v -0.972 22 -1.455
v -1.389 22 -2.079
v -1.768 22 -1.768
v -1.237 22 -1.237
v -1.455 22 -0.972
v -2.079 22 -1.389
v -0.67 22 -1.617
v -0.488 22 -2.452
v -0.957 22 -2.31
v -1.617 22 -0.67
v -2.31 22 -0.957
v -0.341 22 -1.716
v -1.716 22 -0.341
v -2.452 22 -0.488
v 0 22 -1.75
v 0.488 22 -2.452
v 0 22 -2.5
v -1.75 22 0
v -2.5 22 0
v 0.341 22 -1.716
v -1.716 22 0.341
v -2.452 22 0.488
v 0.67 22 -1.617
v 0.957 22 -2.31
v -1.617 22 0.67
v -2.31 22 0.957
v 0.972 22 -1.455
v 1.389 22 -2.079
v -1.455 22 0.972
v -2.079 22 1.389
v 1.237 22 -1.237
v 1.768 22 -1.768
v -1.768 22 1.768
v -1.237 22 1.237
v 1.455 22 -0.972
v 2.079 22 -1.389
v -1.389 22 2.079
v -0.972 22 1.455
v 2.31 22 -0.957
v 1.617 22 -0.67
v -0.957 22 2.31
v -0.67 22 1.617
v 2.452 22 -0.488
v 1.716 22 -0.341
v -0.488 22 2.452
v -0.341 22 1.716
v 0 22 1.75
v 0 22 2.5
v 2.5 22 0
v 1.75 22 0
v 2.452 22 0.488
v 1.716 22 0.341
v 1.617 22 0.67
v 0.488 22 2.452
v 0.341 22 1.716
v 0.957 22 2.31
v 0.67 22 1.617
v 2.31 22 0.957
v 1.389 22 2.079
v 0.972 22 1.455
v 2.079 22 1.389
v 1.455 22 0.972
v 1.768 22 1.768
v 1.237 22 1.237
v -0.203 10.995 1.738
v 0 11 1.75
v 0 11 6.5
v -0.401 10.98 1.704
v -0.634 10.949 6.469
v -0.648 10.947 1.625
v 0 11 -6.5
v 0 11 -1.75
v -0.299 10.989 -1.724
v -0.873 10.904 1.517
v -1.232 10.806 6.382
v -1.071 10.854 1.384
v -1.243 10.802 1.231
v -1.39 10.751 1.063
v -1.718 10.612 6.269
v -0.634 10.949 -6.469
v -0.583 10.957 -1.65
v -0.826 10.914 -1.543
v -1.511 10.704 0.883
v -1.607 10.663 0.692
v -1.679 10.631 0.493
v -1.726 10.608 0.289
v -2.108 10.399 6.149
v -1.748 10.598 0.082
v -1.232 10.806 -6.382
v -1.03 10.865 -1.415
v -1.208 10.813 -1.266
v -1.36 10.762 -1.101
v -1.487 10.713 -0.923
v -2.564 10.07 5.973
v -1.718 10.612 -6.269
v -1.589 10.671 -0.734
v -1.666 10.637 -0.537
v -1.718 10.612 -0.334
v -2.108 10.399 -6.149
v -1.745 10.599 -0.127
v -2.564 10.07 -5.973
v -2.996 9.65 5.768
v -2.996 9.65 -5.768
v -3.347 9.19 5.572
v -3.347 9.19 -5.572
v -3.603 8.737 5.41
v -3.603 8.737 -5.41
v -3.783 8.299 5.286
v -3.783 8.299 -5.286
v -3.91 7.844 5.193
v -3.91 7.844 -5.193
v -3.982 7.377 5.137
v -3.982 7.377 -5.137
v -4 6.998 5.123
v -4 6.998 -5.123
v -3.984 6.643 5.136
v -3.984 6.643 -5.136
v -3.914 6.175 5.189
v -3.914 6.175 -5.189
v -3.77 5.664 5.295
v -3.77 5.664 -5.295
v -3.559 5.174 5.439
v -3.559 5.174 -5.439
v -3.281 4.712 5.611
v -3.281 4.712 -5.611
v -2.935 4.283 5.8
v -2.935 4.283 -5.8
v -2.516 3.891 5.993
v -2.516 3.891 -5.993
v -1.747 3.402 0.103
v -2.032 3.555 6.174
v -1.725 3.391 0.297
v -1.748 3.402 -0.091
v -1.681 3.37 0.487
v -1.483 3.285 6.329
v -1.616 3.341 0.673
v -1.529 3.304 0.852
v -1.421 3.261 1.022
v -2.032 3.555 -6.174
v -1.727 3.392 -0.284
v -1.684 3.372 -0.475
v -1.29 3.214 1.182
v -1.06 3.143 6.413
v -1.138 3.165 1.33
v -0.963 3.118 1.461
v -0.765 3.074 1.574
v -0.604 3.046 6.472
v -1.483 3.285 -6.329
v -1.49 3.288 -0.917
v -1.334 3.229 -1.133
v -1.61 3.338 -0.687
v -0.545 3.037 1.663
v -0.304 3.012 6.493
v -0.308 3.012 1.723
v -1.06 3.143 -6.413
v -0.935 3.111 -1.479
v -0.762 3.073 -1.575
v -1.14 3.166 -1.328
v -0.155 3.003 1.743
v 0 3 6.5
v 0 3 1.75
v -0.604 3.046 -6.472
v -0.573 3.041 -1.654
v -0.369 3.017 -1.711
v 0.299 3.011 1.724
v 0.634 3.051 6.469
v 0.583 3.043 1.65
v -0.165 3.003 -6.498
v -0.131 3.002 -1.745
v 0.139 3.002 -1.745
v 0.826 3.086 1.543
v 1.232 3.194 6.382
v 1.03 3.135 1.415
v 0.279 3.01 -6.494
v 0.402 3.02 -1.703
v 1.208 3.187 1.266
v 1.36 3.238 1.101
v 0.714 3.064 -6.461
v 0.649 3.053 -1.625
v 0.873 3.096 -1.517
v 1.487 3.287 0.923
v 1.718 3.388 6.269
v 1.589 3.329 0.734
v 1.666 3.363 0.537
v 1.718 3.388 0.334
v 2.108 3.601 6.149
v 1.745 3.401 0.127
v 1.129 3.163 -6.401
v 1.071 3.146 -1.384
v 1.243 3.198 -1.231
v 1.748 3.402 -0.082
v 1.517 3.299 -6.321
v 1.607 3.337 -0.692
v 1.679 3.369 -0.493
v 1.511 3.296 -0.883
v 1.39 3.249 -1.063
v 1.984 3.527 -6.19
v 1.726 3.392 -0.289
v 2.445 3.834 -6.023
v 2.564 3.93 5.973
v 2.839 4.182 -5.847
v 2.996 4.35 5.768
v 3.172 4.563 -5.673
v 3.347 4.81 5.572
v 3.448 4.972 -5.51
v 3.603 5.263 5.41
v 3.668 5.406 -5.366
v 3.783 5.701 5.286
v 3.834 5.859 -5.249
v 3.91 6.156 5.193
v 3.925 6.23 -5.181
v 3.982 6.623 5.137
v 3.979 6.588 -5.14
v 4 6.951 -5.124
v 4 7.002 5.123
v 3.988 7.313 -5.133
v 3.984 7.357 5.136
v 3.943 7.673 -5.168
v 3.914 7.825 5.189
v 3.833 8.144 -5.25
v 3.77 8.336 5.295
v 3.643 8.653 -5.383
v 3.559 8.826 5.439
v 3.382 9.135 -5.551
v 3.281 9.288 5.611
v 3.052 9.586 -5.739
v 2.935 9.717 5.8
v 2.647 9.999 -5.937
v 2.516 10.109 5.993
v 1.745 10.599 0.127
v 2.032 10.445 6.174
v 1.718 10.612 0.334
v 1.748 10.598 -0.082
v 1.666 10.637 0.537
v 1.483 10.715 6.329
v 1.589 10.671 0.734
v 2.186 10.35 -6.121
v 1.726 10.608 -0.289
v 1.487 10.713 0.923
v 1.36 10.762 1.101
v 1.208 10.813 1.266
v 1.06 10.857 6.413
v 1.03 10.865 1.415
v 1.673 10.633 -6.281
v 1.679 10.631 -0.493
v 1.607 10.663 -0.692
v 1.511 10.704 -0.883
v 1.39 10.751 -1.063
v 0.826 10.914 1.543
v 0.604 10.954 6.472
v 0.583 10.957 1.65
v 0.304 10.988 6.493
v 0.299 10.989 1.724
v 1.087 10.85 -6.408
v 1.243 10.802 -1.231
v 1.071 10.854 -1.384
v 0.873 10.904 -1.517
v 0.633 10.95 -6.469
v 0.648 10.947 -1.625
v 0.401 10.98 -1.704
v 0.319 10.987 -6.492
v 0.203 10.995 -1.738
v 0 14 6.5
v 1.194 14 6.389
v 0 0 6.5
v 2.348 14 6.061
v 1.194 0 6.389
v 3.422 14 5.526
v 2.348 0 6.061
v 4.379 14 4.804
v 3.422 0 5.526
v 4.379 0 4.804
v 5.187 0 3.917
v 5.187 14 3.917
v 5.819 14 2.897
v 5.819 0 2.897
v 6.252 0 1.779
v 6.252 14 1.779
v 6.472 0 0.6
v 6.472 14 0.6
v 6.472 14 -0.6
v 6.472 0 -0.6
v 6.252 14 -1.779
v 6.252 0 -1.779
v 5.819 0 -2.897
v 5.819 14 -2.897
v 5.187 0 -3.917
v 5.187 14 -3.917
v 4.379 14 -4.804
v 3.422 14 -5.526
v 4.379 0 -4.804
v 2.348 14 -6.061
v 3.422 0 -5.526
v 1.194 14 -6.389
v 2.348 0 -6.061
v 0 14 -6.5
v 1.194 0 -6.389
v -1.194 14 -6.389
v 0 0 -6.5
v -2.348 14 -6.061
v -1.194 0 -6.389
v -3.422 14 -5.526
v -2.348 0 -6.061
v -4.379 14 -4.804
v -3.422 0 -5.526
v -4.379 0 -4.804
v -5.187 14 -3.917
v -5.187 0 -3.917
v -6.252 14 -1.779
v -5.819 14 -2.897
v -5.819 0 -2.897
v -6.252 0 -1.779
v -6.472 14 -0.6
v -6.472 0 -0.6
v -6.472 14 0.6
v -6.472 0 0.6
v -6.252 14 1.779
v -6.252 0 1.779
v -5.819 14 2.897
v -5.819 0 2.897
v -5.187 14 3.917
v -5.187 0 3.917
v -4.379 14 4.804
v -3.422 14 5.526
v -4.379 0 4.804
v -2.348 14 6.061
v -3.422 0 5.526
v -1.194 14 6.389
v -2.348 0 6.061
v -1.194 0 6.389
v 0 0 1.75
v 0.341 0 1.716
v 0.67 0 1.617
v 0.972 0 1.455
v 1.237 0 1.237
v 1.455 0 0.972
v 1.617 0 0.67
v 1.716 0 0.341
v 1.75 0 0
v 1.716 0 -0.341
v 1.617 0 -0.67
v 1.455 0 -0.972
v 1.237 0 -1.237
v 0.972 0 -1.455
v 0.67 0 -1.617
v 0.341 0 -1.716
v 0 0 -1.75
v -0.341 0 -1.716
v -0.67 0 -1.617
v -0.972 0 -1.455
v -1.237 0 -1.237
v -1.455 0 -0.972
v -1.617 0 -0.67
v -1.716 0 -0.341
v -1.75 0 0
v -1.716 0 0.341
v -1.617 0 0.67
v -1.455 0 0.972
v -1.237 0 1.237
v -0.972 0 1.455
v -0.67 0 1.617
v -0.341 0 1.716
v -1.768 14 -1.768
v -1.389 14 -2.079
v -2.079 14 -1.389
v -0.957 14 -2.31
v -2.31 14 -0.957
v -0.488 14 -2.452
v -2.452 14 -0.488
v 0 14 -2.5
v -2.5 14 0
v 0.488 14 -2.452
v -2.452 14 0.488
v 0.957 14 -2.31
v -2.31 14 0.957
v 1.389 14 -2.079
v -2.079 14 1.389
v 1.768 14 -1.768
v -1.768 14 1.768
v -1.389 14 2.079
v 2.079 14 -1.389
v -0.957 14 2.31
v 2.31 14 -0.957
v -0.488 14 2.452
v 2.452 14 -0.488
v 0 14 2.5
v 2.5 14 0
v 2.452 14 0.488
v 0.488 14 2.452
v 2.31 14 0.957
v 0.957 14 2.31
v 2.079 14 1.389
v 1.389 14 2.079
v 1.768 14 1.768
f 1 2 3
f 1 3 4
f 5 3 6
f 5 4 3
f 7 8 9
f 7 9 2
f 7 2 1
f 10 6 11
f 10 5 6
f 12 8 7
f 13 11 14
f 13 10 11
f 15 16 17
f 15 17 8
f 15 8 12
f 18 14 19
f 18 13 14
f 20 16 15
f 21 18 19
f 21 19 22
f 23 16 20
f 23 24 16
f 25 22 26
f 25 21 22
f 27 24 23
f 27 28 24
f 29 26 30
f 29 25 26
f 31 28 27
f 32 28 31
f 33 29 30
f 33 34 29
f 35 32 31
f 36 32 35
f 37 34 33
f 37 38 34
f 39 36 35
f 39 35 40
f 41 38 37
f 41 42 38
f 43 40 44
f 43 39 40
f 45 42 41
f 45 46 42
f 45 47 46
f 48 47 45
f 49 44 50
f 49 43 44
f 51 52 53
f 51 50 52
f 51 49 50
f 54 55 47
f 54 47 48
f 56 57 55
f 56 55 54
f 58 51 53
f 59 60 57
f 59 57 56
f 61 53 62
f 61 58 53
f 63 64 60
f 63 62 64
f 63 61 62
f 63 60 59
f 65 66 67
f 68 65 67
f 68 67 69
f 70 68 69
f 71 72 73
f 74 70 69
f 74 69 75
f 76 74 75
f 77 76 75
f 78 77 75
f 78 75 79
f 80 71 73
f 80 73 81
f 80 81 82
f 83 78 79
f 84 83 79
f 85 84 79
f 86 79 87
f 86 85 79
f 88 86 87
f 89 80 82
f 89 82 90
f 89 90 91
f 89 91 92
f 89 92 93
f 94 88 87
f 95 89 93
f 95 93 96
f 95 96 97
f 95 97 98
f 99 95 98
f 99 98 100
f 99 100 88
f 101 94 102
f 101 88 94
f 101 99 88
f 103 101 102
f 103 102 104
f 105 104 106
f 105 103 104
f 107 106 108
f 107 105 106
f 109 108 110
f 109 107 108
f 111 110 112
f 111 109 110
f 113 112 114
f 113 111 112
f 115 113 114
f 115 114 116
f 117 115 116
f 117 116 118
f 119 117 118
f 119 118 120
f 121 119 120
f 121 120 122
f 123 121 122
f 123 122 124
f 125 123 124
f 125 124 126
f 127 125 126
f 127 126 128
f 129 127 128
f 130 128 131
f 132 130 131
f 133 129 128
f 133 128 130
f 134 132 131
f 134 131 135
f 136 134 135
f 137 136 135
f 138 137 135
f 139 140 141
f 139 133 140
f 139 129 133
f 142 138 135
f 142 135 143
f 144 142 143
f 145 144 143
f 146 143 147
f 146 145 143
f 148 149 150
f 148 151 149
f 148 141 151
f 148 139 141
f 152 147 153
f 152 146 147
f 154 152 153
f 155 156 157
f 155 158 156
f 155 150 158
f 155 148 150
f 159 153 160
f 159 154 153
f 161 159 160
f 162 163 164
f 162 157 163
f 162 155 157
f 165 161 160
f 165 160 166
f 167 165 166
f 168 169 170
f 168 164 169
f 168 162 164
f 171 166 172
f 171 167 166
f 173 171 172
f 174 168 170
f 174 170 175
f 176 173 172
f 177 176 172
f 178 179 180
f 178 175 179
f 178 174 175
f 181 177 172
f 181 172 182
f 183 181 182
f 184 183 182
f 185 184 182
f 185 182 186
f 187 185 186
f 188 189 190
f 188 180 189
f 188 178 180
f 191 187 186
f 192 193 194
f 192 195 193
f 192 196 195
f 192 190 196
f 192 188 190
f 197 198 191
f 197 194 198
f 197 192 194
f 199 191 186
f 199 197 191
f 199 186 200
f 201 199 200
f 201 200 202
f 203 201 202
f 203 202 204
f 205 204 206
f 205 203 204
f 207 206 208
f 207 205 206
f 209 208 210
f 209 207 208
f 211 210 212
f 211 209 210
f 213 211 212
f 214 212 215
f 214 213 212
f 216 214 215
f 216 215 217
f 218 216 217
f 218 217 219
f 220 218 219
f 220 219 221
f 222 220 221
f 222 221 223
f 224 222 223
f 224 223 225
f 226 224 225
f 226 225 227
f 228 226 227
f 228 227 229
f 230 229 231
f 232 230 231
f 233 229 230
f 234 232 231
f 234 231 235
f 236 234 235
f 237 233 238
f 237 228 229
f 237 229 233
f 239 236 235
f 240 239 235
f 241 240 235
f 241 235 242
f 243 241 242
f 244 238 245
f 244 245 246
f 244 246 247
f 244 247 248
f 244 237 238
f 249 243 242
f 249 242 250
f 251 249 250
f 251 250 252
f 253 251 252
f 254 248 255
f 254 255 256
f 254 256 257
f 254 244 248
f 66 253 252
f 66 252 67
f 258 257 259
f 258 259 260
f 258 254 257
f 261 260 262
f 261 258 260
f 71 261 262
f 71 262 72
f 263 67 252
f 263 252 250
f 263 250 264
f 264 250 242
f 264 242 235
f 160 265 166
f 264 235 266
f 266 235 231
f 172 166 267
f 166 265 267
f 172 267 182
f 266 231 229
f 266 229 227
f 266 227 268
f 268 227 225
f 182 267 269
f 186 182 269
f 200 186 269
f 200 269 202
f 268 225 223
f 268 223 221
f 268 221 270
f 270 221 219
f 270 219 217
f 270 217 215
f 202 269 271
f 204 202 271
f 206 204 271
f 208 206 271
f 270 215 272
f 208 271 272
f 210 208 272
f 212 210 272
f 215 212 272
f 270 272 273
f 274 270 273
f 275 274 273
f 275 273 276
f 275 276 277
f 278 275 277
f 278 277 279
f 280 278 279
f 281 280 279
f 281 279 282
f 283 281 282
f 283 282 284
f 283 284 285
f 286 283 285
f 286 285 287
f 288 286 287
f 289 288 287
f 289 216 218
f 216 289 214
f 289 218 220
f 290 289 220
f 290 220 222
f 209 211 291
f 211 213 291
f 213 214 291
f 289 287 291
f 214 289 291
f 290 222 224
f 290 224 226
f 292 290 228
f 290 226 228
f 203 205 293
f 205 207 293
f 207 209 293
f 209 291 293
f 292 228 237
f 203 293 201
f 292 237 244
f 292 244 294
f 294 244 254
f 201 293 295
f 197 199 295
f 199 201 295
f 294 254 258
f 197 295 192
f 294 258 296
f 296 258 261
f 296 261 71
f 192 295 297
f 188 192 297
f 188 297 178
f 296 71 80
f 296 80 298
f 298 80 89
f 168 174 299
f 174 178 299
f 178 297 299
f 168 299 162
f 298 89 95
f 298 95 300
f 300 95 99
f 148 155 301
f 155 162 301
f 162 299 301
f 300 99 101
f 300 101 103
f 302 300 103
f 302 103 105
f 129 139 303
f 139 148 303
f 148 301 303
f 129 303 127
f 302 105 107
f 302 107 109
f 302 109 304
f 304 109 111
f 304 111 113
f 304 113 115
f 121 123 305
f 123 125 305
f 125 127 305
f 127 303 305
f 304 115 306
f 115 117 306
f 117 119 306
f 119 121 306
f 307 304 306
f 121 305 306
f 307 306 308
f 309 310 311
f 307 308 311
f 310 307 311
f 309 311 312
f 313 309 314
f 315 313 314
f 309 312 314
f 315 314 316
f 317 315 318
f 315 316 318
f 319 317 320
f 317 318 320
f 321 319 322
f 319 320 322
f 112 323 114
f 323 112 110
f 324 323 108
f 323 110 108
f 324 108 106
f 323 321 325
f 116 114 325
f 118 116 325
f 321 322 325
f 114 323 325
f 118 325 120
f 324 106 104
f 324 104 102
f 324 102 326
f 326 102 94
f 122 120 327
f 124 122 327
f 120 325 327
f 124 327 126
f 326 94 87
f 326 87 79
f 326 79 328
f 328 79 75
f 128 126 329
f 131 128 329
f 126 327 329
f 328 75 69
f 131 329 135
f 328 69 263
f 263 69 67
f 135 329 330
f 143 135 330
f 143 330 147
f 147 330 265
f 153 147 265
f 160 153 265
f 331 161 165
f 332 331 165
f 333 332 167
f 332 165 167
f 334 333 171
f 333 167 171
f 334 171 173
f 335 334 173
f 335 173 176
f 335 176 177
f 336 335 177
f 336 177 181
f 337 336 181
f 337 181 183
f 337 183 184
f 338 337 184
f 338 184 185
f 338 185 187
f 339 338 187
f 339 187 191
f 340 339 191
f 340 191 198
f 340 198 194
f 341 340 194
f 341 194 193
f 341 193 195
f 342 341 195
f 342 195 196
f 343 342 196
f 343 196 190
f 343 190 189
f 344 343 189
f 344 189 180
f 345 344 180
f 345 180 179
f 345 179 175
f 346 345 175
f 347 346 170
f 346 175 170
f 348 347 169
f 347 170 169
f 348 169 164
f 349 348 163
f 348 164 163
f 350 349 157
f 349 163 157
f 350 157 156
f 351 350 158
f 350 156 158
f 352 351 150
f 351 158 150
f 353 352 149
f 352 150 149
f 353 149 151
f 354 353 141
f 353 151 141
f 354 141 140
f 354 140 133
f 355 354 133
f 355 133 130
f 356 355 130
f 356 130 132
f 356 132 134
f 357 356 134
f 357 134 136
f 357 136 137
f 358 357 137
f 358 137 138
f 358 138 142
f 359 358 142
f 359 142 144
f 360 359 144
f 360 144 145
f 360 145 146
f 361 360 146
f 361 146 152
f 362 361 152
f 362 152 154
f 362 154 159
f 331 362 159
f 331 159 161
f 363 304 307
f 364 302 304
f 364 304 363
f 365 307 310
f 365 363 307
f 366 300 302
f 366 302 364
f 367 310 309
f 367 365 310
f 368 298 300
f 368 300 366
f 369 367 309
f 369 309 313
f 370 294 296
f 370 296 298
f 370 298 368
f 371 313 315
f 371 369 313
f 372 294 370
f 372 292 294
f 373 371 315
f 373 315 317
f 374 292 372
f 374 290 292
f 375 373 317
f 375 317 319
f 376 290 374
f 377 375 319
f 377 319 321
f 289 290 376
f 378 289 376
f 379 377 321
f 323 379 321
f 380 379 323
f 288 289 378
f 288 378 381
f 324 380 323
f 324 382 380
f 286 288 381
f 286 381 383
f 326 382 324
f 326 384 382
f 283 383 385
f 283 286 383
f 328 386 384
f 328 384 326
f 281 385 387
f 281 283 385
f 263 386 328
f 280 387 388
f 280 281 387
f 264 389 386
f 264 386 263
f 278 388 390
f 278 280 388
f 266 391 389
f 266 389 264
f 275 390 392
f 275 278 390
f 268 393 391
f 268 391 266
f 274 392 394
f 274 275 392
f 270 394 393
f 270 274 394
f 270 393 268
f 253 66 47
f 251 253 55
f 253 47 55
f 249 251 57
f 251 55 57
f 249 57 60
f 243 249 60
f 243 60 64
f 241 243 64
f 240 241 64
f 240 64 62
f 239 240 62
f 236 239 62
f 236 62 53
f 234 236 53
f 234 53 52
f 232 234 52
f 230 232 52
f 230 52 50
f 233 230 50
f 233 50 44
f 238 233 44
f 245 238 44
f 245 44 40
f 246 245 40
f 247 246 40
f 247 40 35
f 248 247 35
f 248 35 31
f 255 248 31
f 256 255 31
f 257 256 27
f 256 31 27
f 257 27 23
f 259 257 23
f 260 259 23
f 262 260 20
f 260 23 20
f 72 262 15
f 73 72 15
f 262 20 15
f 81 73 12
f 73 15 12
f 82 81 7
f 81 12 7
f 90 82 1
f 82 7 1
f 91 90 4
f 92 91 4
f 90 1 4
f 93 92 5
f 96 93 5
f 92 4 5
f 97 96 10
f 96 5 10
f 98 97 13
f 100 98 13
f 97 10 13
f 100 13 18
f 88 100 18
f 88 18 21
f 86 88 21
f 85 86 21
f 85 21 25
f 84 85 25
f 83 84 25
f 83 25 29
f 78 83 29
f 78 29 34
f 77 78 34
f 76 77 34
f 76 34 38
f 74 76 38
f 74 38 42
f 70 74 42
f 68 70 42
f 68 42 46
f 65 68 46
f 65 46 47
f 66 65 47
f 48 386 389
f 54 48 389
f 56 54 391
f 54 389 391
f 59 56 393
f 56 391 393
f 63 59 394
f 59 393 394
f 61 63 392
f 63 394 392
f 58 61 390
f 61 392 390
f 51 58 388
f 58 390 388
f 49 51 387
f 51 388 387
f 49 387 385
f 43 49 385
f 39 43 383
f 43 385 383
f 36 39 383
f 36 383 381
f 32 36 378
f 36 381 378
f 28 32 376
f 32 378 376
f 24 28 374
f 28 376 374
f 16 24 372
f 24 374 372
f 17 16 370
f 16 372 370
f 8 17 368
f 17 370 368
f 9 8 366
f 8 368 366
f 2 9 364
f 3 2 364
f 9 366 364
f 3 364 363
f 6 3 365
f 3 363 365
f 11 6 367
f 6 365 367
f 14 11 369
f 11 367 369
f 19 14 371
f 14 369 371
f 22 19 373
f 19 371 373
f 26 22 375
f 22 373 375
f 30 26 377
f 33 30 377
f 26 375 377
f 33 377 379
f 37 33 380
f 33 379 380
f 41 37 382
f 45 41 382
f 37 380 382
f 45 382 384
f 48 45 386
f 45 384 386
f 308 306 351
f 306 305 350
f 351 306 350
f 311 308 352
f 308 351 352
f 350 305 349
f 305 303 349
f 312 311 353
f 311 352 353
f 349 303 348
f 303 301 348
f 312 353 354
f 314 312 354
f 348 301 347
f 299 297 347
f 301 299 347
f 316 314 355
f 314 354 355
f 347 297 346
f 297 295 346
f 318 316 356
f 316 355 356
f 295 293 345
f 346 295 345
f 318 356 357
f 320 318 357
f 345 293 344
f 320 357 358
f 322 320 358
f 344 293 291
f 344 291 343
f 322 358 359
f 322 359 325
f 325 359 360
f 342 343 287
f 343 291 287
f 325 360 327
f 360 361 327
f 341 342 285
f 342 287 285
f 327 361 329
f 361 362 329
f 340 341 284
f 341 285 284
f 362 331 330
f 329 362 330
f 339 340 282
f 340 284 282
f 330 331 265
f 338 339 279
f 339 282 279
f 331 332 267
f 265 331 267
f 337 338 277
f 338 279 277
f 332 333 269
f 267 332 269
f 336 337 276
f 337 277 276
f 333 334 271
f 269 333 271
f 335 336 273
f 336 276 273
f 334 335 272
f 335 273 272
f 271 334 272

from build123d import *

# Parameters (mm, degrees)
SKETCH1_R               = 6.5
BOSS_EXTRUDE1_DEPTH     = 14
SKETCH2_R               = 2.5
BOSS_EXTRUDE2_DEPTH     = 8
CUT_EXTRUDE1_DEPTH      = 24.843238035
CUT_EXTRUDE1_DEPTH_BACK = 24.843238035
SKETCH3_R               = 4
SKETCH4_R               = 1.75
CUT_EXTRUDE2_DEPTH      = 24.843238184


with BuildPart() as part:
    # Sketch1 → Boss-Extrude1 (new body)
    with BuildSketch(Plane(origin=(0, 0, 0), x_dir=(1, 0, 0), z_dir=(0, 1, 0))):
        with Locations(Location((0, 0, 0), (0, 0, 270))):
            Circle(SKETCH1_R)
    extrude(amount=BOSS_EXTRUDE1_DEPTH)

    # Sketch2 → Boss-Extrude2 (add)
    with BuildSketch(Plane(origin=(0, 14, 0), x_dir=(1, 0, 0), z_dir=(0, 1, 0))):
        with Locations(Location((0, 0, 0), (0, 0, 270))):
            Circle(SKETCH2_R)
    extrude(amount=BOSS_EXTRUDE2_DEPTH)

    # Sketch3 → Cut-Extrude1 (cut, two sides: drawn at the far end of the back side and taken through both)
    with BuildSketch(Plane.XY.offset(-CUT_EXTRUDE1_DEPTH_BACK)):
        with Locations(Location((0, 7, 0), (0, 0, 90))):
            Circle(SKETCH3_R)
    extrude(amount=CUT_EXTRUDE1_DEPTH + CUT_EXTRUDE1_DEPTH_BACK, mode=Mode.SUBTRACT)

    # Sketch4 → Cut-Extrude2 (cut, through all)
    with BuildSketch(Plane(origin=(0, 22, 0), x_dir=(1, 0, 0), z_dir=(0, 1, 0))):
        with Locations(Location((0, 0, 0), (0, 0, 270))):
            Circle(SKETCH4_R)
    extrude(amount=-CUT_EXTRUDE2_DEPTH, mode=Mode.SUBTRACT)


solid = part.part
